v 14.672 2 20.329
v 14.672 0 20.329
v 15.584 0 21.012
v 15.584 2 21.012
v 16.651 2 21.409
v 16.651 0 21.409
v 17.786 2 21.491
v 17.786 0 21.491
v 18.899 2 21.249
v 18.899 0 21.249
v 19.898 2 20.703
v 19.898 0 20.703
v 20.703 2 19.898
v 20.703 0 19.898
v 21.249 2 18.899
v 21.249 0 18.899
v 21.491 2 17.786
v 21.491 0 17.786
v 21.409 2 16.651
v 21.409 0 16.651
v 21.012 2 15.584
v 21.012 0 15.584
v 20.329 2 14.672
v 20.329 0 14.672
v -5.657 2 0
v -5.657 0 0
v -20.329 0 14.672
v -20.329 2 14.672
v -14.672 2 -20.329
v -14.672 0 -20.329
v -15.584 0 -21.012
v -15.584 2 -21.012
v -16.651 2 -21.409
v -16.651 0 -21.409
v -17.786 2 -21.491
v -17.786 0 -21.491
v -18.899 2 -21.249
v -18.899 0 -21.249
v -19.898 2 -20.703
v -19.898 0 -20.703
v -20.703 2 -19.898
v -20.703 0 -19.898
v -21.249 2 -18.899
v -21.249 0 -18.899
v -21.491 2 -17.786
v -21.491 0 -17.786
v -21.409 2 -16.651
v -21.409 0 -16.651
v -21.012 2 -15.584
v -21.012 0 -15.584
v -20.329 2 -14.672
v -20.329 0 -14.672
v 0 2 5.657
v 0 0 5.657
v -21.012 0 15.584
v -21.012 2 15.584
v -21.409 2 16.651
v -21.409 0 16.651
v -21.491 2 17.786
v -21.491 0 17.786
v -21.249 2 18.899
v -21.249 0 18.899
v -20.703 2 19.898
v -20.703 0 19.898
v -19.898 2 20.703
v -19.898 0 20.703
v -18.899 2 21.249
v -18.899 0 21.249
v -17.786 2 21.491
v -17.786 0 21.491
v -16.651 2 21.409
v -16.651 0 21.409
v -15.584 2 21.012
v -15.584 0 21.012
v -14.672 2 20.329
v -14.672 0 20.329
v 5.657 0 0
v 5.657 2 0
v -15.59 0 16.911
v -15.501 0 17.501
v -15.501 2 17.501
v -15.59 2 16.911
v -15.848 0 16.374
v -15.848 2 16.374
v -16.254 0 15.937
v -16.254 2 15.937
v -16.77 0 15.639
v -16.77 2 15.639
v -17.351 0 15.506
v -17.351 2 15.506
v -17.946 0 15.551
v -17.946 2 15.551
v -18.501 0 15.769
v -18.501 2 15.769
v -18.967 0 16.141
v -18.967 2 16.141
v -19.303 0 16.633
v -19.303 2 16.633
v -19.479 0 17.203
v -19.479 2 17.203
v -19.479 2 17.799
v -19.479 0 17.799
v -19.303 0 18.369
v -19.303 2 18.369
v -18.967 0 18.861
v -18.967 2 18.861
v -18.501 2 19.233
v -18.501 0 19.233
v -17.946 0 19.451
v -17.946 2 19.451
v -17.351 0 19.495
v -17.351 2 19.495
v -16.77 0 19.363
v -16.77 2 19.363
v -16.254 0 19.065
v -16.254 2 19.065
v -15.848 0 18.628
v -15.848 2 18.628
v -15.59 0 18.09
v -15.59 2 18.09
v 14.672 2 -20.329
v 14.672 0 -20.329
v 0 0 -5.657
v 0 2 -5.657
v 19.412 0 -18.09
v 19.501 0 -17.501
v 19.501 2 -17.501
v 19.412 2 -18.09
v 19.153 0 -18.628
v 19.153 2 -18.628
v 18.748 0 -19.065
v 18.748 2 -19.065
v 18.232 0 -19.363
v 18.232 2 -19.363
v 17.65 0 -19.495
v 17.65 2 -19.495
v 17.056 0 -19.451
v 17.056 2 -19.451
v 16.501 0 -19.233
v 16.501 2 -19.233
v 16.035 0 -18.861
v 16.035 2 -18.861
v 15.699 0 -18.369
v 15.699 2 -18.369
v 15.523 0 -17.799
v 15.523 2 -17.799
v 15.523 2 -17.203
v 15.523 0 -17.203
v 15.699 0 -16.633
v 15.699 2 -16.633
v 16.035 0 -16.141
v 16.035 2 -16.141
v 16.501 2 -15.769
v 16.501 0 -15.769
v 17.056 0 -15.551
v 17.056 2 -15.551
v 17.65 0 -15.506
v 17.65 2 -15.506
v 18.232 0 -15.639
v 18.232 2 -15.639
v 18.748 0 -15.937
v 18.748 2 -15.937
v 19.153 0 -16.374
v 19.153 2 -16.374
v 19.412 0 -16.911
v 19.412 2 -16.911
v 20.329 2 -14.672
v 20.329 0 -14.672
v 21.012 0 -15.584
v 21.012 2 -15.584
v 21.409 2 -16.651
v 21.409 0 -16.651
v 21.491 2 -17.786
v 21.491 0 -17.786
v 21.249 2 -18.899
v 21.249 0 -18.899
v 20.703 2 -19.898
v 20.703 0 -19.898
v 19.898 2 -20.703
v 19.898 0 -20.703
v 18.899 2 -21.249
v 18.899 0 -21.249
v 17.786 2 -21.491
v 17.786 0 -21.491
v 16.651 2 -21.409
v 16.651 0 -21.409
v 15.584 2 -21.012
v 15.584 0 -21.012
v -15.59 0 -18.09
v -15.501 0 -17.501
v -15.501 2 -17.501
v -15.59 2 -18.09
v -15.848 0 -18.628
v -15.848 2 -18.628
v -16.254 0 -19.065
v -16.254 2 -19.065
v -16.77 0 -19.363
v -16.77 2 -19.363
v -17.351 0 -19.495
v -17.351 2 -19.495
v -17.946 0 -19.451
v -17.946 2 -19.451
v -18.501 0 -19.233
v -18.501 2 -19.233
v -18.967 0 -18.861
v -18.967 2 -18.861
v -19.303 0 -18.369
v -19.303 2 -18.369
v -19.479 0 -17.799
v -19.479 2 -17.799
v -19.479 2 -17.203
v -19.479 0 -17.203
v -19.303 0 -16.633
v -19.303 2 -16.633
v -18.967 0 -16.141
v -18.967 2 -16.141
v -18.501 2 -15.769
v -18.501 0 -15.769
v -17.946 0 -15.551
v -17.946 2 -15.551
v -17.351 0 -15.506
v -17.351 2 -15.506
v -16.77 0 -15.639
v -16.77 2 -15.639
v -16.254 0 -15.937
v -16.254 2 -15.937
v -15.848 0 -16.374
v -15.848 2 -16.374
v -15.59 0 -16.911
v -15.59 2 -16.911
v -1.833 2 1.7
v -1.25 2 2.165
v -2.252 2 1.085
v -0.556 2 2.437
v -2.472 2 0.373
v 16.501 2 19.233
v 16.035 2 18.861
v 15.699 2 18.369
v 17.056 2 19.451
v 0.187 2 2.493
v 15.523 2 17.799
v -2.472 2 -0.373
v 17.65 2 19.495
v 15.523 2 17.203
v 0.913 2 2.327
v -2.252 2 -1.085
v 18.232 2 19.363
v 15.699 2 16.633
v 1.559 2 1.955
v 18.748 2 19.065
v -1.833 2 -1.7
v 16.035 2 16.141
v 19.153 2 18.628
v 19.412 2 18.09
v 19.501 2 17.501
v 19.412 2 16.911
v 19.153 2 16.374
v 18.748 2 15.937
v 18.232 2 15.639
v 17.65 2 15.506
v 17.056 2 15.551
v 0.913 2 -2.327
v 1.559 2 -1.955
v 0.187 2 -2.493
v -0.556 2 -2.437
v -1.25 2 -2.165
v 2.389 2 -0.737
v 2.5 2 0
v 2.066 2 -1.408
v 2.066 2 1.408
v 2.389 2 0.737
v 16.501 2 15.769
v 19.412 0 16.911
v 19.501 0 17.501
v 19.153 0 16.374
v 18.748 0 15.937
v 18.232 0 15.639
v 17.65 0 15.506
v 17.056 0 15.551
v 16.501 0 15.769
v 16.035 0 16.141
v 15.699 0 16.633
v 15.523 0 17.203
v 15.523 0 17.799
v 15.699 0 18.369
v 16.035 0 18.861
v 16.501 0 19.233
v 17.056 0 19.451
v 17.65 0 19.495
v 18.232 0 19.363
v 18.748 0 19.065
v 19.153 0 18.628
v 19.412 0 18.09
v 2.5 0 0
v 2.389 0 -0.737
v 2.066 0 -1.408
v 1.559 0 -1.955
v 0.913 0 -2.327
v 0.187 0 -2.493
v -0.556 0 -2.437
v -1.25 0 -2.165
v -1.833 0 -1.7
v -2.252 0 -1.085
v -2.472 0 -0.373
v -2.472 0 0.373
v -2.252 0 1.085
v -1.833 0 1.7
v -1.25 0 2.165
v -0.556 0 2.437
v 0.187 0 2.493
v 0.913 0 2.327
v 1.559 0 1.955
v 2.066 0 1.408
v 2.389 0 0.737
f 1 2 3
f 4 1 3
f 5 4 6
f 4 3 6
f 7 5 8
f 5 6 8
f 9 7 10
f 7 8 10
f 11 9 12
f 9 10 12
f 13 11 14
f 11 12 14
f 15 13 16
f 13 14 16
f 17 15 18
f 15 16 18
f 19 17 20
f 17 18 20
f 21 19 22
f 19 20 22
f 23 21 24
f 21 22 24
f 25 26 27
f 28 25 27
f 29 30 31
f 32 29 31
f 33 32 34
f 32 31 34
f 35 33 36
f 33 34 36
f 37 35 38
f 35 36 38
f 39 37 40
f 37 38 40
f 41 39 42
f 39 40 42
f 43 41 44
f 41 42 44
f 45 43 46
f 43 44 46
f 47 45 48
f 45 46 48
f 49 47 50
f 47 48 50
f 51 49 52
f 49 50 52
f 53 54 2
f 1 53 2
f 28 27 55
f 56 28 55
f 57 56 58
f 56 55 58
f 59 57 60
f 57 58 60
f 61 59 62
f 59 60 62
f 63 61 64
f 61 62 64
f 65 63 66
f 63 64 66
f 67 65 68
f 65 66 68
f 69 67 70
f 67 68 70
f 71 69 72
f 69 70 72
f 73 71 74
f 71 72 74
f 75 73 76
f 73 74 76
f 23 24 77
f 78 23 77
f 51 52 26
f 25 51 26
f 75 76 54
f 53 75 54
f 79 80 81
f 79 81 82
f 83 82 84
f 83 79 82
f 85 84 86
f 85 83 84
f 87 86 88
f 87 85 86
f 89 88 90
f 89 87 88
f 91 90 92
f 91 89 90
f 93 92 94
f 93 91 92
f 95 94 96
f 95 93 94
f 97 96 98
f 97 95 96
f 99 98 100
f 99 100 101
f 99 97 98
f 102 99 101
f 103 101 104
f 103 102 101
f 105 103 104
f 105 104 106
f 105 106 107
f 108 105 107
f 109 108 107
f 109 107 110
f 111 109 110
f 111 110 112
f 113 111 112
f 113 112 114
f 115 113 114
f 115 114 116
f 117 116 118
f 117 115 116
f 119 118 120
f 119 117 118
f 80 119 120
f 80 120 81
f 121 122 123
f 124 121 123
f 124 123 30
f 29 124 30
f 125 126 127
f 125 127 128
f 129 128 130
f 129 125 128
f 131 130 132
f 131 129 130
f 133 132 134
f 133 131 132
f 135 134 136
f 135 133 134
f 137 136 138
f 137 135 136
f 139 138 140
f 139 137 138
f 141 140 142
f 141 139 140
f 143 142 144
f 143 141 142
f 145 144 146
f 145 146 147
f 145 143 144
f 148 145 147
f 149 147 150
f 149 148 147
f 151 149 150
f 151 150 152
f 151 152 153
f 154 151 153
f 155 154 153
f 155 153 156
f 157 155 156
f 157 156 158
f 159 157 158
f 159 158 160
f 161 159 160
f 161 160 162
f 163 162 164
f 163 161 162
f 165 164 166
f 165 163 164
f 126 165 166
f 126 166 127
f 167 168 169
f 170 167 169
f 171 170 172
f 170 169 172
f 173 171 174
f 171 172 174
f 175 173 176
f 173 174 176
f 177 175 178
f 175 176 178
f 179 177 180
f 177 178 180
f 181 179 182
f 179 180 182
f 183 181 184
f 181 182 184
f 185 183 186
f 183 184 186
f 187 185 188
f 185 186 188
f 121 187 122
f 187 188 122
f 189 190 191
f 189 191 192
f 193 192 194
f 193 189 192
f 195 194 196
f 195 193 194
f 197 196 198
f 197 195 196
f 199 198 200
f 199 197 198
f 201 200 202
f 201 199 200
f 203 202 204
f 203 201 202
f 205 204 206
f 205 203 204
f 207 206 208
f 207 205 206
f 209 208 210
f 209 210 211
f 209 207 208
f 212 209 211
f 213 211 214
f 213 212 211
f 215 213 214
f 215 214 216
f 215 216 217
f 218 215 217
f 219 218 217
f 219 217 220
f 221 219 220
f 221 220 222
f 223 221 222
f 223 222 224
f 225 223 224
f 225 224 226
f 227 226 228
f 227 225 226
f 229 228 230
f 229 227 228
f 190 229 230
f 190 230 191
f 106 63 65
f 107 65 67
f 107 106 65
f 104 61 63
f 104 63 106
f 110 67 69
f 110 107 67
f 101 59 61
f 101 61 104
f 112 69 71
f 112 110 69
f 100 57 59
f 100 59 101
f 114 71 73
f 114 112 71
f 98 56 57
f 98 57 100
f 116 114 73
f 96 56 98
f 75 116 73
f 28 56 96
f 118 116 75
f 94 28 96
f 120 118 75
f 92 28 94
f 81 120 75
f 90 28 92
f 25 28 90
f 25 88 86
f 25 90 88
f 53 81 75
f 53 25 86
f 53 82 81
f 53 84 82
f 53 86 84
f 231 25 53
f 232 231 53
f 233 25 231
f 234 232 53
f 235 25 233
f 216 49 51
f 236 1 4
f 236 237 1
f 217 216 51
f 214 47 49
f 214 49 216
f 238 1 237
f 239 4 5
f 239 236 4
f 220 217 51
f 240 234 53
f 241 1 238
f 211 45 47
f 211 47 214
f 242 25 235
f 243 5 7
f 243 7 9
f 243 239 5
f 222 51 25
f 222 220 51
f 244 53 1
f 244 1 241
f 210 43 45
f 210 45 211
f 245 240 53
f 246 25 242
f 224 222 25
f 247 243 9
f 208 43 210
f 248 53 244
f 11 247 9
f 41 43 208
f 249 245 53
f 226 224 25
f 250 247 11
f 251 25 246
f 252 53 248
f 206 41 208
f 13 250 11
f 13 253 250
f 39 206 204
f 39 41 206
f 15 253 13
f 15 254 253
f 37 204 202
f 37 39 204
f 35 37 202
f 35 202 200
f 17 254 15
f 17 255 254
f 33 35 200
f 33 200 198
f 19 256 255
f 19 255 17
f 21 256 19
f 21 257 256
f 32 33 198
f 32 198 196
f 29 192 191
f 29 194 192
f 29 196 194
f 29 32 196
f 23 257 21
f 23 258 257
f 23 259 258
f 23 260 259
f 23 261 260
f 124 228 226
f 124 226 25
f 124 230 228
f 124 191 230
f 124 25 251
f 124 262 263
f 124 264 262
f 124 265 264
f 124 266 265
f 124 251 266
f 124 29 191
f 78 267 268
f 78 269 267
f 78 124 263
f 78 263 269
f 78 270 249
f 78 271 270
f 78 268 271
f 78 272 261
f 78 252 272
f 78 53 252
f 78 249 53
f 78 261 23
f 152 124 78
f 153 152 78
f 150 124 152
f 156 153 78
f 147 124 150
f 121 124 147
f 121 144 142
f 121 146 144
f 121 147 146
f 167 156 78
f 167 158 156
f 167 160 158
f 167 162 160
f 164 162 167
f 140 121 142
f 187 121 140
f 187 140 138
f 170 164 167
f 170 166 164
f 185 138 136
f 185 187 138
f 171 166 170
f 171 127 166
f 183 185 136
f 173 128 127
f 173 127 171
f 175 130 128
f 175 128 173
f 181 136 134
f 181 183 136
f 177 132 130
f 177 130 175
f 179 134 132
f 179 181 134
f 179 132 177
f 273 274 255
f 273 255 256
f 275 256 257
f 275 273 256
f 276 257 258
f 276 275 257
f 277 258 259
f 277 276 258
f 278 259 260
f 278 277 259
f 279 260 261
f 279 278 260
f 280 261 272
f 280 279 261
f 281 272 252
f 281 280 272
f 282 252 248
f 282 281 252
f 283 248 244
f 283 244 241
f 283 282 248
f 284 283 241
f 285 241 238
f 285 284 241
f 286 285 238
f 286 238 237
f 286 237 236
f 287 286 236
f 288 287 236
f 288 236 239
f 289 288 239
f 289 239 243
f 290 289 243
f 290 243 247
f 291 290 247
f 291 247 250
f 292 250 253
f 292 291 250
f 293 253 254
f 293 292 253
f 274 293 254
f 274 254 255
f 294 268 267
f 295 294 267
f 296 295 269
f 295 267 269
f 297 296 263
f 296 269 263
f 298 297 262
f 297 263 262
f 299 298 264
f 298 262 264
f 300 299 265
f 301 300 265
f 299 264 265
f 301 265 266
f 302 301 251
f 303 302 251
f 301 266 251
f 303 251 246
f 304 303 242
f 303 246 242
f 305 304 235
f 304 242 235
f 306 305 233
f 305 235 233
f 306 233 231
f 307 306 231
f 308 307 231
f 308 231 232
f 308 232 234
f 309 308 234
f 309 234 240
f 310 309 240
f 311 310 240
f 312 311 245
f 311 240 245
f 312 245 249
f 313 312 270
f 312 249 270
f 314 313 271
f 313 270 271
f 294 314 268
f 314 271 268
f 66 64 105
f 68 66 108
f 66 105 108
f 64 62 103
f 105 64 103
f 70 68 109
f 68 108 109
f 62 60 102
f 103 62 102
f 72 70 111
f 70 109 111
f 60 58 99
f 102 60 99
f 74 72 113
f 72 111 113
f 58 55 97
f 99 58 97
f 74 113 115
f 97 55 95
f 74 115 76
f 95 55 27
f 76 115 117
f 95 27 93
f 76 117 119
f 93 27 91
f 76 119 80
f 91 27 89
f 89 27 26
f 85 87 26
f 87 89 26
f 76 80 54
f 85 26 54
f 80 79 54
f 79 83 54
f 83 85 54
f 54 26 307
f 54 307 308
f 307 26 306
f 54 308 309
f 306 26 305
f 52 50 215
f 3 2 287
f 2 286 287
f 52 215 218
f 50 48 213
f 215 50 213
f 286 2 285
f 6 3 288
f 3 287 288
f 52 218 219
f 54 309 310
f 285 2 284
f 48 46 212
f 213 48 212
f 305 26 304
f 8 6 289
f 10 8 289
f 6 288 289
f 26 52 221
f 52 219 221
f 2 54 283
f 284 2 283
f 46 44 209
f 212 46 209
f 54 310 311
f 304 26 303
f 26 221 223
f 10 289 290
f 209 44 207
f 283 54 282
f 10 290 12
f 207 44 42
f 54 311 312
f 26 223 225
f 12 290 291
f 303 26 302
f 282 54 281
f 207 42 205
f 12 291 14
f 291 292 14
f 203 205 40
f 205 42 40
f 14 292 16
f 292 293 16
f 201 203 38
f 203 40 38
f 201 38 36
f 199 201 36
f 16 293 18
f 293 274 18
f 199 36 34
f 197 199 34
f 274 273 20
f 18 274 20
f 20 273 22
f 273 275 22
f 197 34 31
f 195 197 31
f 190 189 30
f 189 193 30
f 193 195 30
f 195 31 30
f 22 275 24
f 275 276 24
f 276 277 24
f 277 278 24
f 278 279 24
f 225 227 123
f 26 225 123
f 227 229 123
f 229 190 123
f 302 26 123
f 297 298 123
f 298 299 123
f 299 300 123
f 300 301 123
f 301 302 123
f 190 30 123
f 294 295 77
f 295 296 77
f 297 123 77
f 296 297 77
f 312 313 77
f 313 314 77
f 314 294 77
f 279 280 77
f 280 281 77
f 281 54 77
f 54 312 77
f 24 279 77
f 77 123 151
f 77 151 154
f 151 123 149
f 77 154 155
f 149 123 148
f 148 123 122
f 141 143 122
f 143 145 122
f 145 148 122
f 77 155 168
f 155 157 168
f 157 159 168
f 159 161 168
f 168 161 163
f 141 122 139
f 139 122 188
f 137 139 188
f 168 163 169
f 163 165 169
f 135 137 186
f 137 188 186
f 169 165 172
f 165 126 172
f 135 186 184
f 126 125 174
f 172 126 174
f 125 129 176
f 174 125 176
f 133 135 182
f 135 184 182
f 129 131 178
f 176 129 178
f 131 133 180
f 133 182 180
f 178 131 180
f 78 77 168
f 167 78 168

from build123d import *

# Parameters (mm, degrees)
SKETCH1_R           = 2
BOSS_EXTRUDE1_DEPTH = 2
SKETCH2_R           = 2.5
CUT_EXTRUDE1_DEPTH  = 2


with BuildPart() as part:
    # Sketch1 → Boss-Extrude1 (new body)
    with BuildSketch(Plane(origin=(0, 0, 0), x_dir=(1, 0, 0), z_dir=(0, 1, 0))):
        with BuildLine():
            Line((-5.656854249, 0), (-20.329319959, -14.67246571))
            ThreePointArc((-20.329319959, -14.67246571), (-20.329319959, -20.329319959), (-14.67246571, -20.329319959))
            Line((-14.67246571, -20.329319959), (0, -5.656854249))
            Line((0, -5.656854249), (14.67246571, -20.329319959))
            ThreePointArc((14.67246571, -20.329319959), (20.329319959, -20.329319959), (20.329319959, -14.67246571))
            Line((20.329319959, -14.67246571), (5.656854249, 0))
            Line((5.656854249, 0), (20.329319959, 14.67246571))
            ThreePointArc((20.329319959, 14.67246571), (20.329319959, 20.329319959), (14.67246571, 20.329319959))
            Line((14.67246571, 20.329319959), (0, 5.656854249))
            Line((0, 5.656854249), (-14.67246571, 20.329319959))
            ThreePointArc((-14.67246571, 20.329319959), (-20.329319959, 20.329319959), (-20.329319959, 14.67246571))
            Line((-20.329319959, 14.67246571), (-5.656854249, 0))
        make_face()
        with Locations((-17.500892834, 17.500892834)):
            Circle(SKETCH1_R, mode=Mode.SUBTRACT)
        with Locations((17.500892834, 17.500892834)):
            Circle(SKETCH1_R, mode=Mode.SUBTRACT)
        with Locations((17.500892834, -17.500892834)):
            Circle(SKETCH1_R, mode=Mode.SUBTRACT)
        with Locations((-17.500892834, -17.500892834)):
            Circle(SKETCH1_R, mode=Mode.SUBTRACT)
    extrude(amount=BOSS_EXTRUDE1_DEPTH)

    # Sketch2 → Cut-Extrude1 (cut)
    with BuildSketch(Plane(origin=(0, 2, 0), x_dir=(1, 0, 0), z_dir=(0, 1, 0))):
        Circle(SKETCH2_R)
    extrude(amount=-CUT_EXTRUDE1_DEPTH, mode=Mode.SUBTRACT)


solid = part.part
